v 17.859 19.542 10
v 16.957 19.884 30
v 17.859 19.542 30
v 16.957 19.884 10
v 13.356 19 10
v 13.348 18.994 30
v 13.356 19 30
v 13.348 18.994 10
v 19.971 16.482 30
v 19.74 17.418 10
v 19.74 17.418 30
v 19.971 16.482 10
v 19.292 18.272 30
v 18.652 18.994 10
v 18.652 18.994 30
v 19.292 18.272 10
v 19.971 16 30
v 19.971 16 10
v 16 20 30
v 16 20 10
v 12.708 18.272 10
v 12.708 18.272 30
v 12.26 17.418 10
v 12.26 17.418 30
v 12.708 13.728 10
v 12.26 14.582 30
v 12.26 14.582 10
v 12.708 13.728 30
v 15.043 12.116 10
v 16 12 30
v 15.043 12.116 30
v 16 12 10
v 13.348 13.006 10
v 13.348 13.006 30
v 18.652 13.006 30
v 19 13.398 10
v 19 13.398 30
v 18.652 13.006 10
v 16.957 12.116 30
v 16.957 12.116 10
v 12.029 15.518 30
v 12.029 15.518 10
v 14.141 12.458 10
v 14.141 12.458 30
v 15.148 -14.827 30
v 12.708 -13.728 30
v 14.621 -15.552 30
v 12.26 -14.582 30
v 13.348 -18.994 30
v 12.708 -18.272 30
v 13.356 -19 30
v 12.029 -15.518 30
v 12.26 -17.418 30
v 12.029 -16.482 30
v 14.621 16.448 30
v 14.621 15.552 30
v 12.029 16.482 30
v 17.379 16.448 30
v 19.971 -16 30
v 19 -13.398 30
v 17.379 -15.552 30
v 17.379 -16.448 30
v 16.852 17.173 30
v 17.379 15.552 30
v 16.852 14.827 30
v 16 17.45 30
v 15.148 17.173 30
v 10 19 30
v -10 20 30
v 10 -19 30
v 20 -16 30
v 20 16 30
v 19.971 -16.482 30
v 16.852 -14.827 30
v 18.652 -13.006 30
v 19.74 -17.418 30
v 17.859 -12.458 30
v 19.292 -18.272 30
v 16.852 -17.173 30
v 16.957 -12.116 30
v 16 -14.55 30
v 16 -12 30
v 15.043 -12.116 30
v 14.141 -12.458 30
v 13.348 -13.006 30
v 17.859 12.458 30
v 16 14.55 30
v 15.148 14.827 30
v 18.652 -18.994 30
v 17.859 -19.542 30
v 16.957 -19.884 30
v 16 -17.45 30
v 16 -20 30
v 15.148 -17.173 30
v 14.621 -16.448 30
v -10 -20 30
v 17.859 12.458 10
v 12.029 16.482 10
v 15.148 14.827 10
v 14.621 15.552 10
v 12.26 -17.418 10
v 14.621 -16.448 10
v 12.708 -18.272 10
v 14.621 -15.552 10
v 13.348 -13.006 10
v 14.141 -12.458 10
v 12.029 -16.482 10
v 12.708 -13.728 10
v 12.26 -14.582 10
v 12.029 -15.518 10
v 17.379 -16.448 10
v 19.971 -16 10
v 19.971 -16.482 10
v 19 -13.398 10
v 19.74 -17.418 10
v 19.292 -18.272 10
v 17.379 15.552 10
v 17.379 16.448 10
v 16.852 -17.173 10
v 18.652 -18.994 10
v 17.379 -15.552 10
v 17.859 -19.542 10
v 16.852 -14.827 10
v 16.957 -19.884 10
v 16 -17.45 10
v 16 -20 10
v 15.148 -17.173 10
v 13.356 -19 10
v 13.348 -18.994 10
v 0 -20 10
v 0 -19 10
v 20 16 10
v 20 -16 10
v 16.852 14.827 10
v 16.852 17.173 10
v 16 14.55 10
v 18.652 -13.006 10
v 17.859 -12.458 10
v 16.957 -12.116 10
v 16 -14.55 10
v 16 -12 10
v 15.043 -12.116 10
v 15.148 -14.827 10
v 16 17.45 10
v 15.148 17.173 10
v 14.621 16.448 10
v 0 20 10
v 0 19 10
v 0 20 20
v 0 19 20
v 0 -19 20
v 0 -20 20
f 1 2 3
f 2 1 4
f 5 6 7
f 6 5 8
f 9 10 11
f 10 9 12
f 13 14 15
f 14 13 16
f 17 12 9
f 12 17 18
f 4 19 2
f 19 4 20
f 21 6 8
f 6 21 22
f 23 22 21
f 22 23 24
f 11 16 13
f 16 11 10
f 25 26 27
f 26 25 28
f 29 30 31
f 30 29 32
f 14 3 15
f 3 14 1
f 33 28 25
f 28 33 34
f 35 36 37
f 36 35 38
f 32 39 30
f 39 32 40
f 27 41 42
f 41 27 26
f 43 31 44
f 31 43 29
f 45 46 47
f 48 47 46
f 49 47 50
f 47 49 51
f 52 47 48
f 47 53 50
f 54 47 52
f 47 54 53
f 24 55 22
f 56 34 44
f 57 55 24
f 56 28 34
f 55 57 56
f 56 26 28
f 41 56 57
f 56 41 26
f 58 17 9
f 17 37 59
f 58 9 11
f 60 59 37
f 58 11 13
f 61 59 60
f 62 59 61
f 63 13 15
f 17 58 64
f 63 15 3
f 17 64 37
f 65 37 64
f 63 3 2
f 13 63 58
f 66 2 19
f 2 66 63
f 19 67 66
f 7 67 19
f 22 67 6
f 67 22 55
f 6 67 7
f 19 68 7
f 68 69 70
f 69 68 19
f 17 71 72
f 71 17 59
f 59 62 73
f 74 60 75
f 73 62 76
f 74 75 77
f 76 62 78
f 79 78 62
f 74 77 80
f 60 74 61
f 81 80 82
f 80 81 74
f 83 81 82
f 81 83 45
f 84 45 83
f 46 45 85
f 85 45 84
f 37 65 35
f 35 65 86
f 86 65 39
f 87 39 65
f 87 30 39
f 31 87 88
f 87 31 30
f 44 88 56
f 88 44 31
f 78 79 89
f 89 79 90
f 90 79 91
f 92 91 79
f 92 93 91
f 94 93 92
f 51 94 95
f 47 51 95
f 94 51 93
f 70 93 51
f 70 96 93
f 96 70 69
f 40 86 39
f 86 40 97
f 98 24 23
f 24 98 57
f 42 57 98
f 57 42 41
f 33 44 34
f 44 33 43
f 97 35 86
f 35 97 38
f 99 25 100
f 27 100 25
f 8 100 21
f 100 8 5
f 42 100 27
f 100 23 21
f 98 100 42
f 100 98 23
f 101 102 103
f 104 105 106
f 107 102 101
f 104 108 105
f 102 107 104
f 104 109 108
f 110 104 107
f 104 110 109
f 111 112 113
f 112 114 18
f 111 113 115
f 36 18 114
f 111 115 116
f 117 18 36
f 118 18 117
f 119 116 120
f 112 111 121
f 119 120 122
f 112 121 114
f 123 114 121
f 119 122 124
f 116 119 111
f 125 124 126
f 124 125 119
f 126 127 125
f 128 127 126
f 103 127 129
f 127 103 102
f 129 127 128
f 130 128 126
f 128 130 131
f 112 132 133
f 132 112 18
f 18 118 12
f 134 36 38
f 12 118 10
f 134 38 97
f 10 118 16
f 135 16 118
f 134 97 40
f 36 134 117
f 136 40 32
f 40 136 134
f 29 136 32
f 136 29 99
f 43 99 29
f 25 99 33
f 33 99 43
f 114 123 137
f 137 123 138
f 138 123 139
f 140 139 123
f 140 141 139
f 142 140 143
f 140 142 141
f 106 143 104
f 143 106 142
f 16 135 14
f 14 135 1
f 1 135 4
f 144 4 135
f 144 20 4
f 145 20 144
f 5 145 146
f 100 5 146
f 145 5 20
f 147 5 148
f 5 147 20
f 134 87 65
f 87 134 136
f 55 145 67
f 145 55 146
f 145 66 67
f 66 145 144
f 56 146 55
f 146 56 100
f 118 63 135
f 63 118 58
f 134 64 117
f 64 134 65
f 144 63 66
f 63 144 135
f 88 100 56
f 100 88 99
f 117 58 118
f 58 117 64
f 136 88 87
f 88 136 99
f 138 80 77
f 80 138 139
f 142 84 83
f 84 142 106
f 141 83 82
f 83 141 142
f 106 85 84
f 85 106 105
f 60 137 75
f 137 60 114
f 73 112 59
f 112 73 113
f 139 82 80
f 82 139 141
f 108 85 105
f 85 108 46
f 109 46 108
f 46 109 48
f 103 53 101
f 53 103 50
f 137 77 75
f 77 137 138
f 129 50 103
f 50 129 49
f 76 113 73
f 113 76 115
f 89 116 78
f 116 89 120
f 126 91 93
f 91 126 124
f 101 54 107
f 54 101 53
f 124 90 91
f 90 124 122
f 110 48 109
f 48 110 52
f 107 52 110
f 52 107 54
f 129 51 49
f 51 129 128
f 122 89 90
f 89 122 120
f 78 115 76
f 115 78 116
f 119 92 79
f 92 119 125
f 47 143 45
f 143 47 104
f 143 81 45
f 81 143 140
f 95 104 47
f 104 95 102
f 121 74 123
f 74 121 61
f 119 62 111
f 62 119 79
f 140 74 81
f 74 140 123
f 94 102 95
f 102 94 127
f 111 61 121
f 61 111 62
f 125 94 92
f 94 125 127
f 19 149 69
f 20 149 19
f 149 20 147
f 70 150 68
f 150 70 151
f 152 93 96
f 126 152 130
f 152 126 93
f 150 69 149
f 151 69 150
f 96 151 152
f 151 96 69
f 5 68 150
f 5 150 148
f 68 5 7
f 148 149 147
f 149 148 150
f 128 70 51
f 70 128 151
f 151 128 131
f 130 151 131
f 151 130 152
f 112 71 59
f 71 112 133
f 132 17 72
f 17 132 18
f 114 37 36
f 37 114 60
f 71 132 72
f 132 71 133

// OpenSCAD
// file: ../vitamin/fan.scad
/*
 * fan
 *
 * Copyright 2013 <b@Zi.iS>
 * License CC BY 3.0
 */

include <../config.scad>;

fan();

module fan(
	size = fan40
) {
	echo("Fan ", size[0], "mm");
	color([.3,.3,.3]) {
		difference() {
			hull() {
				for(x=[0:1]) {
					for(y=[0:1]) {
						translate([
							-size[2]/2 + size[2] * x,
							-size[2]/2 + size[2] * y,
							0
						]) {
							cylinder(
								r = (size[0] - size[2])/2,
								h = size[1]
							);
						}
					}
				}
			}
			for(x=[0:1]) {
				for(y=[0:1]) {
					translate([
						-size[2]/2 + size[2] * x,
						-size[2]/2 + size[2] * y,
						0
					]) {
						e() cylinder(
							r = m_pilot(size[3]),
							h = size[1]
						);
					}
				}
			}
			e() cylinder(
				r = size[0]/2*.9,
				h = size[1]
			);
		}
	}

	color([.7,.7,.7]) {
		cylinder(
			r = size[0]/2*.4,
			h = size[1]
		);
		linear_extrude(
			twist=30,
			height =  size[1]
		) {
			square(center=true, [size[0]*.8,1]);
			square(center=true, [1, size[0]*.8]);
		}
	}
}
// file: ../config.scad
/*
 * config
 *
 * Copyright 2013 <b@Zi.iS>
 * License CC BY 3.0
 */

$fa = 1;
$fs = 1;
preview = 1;

// preview colors
color_steal = [.8,.8,.8];
color_wood = [.3,.3,0];
color_print = [0,.8,0];

// metric bolt sizes
function m_hole(size) = size*1.1/2;
function m_pilot(size) = size*.9/2;

mounting_bolt = 3;

// slightly move and slightly elongate objects in preview to overcome scad rounding errors
module e() {
	if(preview==1) {
		translate([
			0,
			0,
			-.1
		]) {
			scale([
				1,
				1,
				1.1
			]) {
				child();
			}
		}
	} else {
		child();
	}
}

module m_washer(
	size = 3
) {
	color(color_steal) {
		difference() {
			cylinder(
				r = size/2*2,
				h = size*.2
			);
			e() cylinder(
				r = size/2,
				h = size*.2
			);
		}
	}
	translate([
		0,
		0,
		size*.2
	]) {
		child();
	}
}

module m_nut(
	size = 3
) {
	color(color_steal) {
		difference() {
			cylinder(
				r = size*1.8/2,
				h = size*.8,
				$fn = 6
			);
		}
	}
	translate([
		0,
		0,
		size*.8
	]) {
		child();
	}
}

module m_nylock(
	size = 3
) {
	color(color_steal) {
		difference() {
			cylinder(
				r = size*1.8/2,
				h = size,
				$fn = 6
			);
		}
	}
	translate([
		0,
		0,
		size
	]) {
		child();
	}
}

module screw(
	r = 1,
	h = 1,
	pitch = 5,
) {
	linear_extrude(
		height = h,
		twist = -h/pitch*360
	) {
		translate([pitch/5,0,0]) { //H=.2*p works better in plastic then ISO's H=.866*p
			circle(
				r=r 
			);
		}
	}
}

fan40 = [
	40,			//width/length
	10,			//height
	32,			//bolt pitch
	3,			//bolt
];

lm8uu = [
	15.2/2,	//outside
	8/2,	//inside
	26,		//length
];
// main file
/*
 * fan baffle
 *
 * Copyright 2013 <b@Zi.iS>
 * License CC BY 3.0
 */

include <../config.scad>;
use <../vitamin/fan.scad>;

if(preview==1) {
	%fan();
	fan_baffle();
} else {
	rotate([
		0,
		180,
		0
	]) {
		fan_baffle();
	}
}

module fan_baffle(
	size = fan40
) {
	color([0,.5,0]) {
		translate([
			10,
			size[0]/2,
			size[1]*2
		]) {
			rotate([
				0,
				-90,
				90
			]) {
				linear_extrude(height = size[0]) {
					polygon(points=[
						[0,10],
						[10,0],
						[10,20],
					]);
				}
				translate([
					-10,
					-size[2]/2+10,
					0
				]) {
					cube([
						20,
						size[2]/2,
						1
					]);
				}
				translate([
					-10,
					-size[2]/2+10,
					size[0] -1
				]) {
					cube([
						20,
						size[2]/2,
						1
					]);
				}
				translate([
					-10,
					-size[0]/2+10,
					(size[0]-size[2])/2
				]) {
					cube([
						20,
						1,
						size[2]
					]);
				}
				for(i=[0:1]) {
					translate([
						-10,
						10-size[2]/2,
						(size[0]-size[2])/2 + size[2]* i
					]) {
						rotate([
							0,
							90,
							0
						]) {
							difference() {
								cylinder(
									r = (size[0]-size[2])/2,
									h = 20
								);
								//pilot
								translate([0,0,-1]) {
									cylinder(
										r = 2.9/2,
										h = 22
									);
								}						
							}
						}
					}
				}
			}
		}
	}
}
